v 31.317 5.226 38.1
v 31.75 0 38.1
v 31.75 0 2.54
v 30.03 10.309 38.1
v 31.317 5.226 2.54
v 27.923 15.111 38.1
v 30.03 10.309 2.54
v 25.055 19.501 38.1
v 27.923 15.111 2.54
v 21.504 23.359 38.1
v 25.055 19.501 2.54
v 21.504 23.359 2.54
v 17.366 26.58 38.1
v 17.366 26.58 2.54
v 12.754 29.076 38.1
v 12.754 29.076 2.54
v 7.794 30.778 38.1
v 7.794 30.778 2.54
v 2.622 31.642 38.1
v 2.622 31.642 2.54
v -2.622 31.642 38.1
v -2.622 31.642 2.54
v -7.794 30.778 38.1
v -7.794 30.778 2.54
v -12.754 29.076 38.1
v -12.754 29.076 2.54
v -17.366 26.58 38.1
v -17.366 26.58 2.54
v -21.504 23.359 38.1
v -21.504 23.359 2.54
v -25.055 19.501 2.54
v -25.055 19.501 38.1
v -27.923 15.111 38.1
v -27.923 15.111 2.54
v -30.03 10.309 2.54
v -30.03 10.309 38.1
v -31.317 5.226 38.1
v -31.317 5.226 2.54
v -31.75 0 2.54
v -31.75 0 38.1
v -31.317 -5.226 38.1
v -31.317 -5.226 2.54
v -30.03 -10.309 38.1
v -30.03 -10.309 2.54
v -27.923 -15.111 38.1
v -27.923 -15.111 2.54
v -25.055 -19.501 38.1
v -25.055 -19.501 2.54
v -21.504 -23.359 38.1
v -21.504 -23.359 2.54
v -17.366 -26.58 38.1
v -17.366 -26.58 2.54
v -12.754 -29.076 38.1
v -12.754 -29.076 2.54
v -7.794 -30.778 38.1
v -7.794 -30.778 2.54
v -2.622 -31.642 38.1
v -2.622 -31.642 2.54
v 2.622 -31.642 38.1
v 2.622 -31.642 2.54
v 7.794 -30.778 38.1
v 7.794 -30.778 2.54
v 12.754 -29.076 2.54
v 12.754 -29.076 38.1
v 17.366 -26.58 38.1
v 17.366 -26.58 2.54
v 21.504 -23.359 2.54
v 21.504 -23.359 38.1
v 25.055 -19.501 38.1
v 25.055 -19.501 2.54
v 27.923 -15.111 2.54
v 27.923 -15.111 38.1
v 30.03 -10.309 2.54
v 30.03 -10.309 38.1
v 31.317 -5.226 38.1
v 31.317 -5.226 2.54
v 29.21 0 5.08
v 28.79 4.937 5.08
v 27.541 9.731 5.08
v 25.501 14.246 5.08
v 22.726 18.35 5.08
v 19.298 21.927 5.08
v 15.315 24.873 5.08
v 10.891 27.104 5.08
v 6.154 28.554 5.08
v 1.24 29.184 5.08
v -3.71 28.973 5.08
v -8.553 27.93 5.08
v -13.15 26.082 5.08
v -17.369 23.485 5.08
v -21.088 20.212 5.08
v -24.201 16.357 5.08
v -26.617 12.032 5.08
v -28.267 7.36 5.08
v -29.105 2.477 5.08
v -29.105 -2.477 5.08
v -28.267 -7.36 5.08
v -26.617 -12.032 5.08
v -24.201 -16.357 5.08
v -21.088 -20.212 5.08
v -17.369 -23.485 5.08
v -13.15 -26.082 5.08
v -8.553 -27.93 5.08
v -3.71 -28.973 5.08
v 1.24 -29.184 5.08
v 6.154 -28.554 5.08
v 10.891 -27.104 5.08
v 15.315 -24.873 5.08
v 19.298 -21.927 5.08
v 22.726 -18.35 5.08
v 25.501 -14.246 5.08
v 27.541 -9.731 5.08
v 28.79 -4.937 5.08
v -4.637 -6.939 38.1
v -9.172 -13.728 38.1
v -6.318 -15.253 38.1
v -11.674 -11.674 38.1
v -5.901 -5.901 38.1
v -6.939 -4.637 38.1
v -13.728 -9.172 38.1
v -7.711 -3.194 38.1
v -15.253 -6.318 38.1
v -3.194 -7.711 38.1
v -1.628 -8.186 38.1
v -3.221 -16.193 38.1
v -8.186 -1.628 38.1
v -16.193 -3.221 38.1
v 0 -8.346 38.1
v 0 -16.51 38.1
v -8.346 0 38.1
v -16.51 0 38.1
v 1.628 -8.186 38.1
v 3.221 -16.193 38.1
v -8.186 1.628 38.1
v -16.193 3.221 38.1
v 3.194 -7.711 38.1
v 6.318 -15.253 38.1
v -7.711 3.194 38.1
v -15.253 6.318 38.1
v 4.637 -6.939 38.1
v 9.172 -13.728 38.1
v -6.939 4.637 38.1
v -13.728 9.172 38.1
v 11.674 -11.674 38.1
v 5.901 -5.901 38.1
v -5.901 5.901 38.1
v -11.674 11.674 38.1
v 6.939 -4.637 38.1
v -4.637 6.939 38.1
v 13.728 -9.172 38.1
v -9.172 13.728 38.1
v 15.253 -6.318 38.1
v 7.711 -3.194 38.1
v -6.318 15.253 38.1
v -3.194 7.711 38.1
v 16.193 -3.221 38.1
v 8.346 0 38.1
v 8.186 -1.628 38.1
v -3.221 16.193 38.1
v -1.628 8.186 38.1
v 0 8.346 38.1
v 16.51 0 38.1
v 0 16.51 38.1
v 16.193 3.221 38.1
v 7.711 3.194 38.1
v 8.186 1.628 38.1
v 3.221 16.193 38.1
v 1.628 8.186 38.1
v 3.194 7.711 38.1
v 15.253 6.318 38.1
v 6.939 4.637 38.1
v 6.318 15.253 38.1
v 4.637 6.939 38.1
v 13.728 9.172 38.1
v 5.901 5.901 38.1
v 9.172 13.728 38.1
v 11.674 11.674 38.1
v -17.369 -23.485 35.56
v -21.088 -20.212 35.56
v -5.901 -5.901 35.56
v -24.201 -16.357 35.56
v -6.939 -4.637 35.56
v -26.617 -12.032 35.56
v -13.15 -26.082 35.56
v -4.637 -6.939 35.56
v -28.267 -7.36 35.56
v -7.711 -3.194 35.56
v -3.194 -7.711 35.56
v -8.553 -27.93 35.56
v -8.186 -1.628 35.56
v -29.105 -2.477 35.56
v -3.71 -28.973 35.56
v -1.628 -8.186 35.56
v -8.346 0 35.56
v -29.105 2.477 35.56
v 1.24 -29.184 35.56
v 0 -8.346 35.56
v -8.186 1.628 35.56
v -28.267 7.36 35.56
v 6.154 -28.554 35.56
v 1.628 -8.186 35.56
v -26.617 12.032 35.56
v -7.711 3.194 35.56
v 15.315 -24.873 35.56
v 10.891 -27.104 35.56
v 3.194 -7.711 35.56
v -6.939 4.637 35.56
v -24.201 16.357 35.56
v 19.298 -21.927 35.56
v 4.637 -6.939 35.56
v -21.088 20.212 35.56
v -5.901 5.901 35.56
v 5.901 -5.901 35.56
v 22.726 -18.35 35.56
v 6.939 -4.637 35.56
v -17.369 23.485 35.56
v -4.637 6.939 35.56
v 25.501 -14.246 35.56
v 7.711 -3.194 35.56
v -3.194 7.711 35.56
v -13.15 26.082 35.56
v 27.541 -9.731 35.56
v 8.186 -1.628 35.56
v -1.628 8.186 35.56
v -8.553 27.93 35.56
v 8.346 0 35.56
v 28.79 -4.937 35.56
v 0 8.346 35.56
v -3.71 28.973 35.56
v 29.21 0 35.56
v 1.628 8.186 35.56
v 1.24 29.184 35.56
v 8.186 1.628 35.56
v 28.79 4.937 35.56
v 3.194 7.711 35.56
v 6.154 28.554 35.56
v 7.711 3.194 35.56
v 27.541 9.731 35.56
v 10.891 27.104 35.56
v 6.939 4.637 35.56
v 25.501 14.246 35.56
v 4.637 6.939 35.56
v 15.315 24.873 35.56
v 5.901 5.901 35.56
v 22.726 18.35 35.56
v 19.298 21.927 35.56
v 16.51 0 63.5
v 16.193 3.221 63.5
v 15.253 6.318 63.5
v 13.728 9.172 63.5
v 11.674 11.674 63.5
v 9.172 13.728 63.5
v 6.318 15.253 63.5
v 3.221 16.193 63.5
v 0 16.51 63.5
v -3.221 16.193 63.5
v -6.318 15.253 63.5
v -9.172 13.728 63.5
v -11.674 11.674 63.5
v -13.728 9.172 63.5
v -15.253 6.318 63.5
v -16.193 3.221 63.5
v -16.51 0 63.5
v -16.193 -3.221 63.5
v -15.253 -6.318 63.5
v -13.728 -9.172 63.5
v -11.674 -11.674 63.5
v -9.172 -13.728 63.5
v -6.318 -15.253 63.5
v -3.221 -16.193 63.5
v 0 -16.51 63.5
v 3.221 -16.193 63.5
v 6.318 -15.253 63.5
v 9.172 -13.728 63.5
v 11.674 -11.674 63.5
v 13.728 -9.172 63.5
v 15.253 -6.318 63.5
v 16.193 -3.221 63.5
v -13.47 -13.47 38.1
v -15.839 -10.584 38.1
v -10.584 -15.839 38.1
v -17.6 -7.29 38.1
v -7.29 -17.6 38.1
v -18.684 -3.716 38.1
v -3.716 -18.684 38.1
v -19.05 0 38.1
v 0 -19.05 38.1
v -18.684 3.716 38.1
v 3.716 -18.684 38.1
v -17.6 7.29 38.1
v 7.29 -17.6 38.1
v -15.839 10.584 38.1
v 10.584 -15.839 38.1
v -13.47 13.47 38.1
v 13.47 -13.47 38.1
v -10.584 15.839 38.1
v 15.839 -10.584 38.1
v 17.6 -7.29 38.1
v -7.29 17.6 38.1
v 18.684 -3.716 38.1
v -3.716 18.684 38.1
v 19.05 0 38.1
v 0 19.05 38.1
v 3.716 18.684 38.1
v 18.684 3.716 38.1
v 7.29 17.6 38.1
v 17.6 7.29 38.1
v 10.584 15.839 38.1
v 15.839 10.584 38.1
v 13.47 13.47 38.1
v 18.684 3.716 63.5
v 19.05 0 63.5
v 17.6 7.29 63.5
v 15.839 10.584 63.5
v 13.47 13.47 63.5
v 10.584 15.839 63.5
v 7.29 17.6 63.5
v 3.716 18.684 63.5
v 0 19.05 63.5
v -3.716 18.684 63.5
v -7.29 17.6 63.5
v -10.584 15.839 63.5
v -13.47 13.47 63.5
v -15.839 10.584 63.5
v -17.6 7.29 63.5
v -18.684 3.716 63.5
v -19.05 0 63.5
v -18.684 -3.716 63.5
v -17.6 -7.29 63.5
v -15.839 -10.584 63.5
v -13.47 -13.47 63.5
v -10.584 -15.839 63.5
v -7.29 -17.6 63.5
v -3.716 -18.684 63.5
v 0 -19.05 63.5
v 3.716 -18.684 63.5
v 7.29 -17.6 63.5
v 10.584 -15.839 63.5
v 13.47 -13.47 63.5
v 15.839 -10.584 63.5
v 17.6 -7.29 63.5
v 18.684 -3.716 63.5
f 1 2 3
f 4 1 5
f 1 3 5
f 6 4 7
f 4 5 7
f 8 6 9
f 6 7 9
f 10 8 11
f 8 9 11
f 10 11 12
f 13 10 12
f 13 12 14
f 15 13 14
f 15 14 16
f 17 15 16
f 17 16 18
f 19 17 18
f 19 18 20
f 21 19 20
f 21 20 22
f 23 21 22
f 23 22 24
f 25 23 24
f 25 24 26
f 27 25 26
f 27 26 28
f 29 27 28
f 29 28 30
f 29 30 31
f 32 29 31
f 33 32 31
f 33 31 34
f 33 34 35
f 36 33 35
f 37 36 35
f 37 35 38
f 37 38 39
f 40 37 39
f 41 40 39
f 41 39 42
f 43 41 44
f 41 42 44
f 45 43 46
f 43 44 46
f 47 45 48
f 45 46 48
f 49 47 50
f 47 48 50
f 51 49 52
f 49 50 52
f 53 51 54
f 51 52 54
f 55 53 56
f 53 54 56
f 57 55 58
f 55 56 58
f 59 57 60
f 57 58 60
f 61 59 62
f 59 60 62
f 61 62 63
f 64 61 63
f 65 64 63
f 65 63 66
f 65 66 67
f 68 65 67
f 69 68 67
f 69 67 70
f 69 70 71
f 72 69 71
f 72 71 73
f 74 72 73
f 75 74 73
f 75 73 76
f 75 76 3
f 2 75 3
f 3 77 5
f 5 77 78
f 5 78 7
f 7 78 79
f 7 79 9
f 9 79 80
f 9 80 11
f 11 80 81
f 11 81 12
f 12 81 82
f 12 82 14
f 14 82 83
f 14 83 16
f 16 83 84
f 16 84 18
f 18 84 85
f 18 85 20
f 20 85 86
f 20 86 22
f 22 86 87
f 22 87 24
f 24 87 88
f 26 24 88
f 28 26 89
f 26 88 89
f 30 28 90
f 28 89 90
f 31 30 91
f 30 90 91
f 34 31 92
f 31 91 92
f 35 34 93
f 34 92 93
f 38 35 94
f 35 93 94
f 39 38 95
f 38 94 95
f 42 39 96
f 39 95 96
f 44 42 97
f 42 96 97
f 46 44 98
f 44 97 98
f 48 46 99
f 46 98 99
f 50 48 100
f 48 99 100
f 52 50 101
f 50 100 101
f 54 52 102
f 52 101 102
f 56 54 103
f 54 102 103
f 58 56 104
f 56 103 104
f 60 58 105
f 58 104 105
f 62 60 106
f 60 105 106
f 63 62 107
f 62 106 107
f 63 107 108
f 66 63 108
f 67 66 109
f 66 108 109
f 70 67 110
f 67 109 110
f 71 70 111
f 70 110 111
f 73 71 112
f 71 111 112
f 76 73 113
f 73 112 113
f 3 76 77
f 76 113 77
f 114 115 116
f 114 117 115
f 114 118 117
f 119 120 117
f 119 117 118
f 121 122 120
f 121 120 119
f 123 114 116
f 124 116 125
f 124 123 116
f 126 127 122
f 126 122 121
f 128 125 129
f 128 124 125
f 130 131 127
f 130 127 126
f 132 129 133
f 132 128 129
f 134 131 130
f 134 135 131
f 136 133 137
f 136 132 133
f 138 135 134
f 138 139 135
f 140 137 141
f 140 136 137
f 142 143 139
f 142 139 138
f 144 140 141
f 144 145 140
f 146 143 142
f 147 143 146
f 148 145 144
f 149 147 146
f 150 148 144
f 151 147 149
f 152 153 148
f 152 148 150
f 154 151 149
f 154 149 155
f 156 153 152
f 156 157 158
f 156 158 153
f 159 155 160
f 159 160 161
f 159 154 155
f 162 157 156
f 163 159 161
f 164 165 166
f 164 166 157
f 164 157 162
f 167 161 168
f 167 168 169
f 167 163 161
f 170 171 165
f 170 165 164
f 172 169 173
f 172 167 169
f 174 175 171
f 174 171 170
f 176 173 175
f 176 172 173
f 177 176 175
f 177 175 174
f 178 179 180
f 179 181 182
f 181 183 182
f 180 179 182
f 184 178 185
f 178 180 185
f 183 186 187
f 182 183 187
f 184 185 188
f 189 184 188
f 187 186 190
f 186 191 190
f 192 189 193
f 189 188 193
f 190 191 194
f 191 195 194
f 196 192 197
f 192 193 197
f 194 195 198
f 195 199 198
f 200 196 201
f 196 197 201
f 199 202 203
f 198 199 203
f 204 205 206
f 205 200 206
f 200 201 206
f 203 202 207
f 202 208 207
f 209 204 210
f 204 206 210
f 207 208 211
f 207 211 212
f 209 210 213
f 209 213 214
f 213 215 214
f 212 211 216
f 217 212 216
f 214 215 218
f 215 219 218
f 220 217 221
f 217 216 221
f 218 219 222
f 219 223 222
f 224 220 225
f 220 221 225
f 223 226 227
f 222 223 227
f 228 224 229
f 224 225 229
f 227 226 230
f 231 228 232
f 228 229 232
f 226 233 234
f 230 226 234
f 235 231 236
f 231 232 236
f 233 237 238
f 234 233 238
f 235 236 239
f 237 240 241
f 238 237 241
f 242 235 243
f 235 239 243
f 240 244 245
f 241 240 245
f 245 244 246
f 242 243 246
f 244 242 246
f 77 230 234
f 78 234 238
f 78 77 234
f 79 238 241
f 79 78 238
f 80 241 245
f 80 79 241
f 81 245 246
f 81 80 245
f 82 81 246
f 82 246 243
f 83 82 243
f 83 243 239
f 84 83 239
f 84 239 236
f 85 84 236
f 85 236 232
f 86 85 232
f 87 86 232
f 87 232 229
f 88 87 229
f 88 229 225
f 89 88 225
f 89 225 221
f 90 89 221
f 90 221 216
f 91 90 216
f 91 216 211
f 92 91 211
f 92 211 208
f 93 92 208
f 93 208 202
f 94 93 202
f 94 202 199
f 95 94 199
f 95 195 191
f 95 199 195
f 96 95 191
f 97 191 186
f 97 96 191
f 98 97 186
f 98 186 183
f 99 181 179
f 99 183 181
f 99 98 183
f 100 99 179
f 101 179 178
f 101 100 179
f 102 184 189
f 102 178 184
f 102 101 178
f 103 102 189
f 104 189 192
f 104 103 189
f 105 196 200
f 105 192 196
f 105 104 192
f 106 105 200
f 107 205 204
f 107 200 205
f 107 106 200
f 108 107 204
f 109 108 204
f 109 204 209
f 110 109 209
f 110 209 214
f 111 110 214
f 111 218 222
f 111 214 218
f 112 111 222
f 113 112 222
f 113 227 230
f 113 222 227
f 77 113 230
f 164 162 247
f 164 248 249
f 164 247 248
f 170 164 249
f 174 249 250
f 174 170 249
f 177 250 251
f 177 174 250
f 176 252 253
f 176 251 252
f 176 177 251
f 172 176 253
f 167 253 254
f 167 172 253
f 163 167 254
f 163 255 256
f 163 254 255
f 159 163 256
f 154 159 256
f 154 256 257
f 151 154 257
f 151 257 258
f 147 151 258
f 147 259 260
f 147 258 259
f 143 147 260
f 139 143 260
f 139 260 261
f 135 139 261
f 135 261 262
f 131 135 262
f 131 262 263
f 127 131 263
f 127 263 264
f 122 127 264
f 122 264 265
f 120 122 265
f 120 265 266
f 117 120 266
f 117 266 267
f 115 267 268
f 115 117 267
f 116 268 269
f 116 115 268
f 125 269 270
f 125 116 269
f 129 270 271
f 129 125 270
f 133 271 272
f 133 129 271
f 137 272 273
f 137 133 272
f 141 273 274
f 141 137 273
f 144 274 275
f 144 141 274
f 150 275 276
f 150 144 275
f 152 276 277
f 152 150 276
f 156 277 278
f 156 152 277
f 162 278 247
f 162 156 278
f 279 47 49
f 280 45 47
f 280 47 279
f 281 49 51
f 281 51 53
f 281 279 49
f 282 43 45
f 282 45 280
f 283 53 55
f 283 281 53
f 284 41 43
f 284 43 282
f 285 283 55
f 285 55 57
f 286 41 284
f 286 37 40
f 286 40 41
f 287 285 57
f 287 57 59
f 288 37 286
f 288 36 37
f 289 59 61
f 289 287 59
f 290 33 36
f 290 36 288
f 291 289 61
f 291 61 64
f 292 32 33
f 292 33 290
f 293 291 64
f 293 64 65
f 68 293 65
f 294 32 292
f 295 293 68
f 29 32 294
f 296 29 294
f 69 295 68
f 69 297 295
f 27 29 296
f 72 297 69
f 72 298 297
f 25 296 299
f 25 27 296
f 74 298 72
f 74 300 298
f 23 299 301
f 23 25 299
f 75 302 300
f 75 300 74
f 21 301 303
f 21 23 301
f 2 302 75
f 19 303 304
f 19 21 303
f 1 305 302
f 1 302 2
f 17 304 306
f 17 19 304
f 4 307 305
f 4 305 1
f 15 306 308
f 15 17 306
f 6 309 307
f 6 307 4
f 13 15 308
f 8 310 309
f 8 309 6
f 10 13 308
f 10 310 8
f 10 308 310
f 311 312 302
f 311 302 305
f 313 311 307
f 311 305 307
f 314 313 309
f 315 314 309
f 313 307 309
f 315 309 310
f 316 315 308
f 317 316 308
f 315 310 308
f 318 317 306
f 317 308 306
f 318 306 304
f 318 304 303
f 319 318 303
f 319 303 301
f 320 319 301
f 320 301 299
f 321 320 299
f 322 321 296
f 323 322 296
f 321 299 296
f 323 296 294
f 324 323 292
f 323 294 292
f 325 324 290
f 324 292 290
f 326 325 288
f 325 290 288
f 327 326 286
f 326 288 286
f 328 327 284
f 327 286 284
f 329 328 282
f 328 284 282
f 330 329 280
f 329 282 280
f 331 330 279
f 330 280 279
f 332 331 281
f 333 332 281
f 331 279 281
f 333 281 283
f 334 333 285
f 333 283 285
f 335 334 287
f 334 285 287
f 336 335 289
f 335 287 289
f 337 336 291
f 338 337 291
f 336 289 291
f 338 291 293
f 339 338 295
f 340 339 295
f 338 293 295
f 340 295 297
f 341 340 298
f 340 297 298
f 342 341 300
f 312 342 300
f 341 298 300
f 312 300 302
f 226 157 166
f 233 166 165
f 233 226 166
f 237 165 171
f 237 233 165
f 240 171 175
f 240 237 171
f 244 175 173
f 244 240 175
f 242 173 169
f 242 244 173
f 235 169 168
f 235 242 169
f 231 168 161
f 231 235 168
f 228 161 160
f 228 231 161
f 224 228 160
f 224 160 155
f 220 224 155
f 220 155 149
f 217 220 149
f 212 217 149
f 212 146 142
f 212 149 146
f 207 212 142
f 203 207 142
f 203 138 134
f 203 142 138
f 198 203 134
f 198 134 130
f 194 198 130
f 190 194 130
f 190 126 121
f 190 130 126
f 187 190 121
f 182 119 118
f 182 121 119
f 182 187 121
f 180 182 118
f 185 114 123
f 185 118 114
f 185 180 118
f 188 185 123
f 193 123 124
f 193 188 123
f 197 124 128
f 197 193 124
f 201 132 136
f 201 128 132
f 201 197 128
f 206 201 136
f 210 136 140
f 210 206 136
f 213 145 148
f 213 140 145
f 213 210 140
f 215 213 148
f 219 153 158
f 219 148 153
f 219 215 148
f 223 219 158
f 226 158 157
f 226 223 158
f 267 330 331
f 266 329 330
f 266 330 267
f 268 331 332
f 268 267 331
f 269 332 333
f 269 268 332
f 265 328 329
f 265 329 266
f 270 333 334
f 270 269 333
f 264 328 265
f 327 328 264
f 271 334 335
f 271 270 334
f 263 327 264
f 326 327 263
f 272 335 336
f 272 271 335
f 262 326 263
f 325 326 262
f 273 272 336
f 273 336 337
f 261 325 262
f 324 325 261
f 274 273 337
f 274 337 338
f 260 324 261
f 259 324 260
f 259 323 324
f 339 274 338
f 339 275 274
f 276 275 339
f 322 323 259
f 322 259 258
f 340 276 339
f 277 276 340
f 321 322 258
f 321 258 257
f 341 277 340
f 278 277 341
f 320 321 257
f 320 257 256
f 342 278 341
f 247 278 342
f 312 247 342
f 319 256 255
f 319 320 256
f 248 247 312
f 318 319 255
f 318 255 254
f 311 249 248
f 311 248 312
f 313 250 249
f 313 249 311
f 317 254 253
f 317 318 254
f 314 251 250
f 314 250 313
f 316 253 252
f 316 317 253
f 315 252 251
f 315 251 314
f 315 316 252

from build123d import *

# Parameters (mm, degrees)
F0_R     = 31.75
F0_R_2   = 8.3458742529
F1_DEPTH = 38.1
F2_T     = -2.54
F3_R     = 19.05
F3_R_2   = 8.3458742529
F4_DEPTH = 25.4
F6_T     = -2.54


# Not quite as in the source:
# - a fillet or chamfer that OpenCascade refuses, or shapes differently, is made with other operations: its cross-section is extruded or revolved along the edge and cut away or added
# - the program builds the solid bodies; features that only make, move or delete a surface that nothing else refers to are left out


with BuildPart() as f1:
    # F0 (on Top) → F1 (new body)
    with BuildSketch(Plane.XY):
        Circle(F0_R)
        Circle(F0_R_2, mode=Mode.SUBTRACT)
    extrude(amount=F1_DEPTH)

    # F2
    f2_openings = [f1.faces().sort_by_distance(p)[0] for p in [
        (-30.851974, 0, 0),
        (-8.345874, 0, 19.05),
    ]]
    offset(amount=F2_T, openings=f2_openings)

    # F3 (on face) → F4 (join)
    with BuildSketch(Plane.XY.offset(38.1)):
        Circle(F3_R)
        Circle(F3_R_2, mode=Mode.SUBTRACT)
    extrude(amount=F4_DEPTH)

    # F6
    f6_openings = [f1.faces().sort_by_distance(p)[0] for p in [
        (-18.511185, 0, 63.5),
        (-8.345874, 0, 49.53),
    ]]
    offset(amount=F6_T, openings=f6_openings, kind=Kind.INTERSECTION)

    # F7: chamfer of 5.08 on 1 edges, made by hand

    # F7_s1 → F7_t2 (revolve, cut)
    with BuildSketch(Plane.XZ):
        Polygon((34.29, 0), (29.21, 5.08), (29.21, 0), align=None)
    revolve(axis=Axis((0, 0, 0), (0, 0, 1)), mode=Mode.SUBTRACT)


solid = f1.part
